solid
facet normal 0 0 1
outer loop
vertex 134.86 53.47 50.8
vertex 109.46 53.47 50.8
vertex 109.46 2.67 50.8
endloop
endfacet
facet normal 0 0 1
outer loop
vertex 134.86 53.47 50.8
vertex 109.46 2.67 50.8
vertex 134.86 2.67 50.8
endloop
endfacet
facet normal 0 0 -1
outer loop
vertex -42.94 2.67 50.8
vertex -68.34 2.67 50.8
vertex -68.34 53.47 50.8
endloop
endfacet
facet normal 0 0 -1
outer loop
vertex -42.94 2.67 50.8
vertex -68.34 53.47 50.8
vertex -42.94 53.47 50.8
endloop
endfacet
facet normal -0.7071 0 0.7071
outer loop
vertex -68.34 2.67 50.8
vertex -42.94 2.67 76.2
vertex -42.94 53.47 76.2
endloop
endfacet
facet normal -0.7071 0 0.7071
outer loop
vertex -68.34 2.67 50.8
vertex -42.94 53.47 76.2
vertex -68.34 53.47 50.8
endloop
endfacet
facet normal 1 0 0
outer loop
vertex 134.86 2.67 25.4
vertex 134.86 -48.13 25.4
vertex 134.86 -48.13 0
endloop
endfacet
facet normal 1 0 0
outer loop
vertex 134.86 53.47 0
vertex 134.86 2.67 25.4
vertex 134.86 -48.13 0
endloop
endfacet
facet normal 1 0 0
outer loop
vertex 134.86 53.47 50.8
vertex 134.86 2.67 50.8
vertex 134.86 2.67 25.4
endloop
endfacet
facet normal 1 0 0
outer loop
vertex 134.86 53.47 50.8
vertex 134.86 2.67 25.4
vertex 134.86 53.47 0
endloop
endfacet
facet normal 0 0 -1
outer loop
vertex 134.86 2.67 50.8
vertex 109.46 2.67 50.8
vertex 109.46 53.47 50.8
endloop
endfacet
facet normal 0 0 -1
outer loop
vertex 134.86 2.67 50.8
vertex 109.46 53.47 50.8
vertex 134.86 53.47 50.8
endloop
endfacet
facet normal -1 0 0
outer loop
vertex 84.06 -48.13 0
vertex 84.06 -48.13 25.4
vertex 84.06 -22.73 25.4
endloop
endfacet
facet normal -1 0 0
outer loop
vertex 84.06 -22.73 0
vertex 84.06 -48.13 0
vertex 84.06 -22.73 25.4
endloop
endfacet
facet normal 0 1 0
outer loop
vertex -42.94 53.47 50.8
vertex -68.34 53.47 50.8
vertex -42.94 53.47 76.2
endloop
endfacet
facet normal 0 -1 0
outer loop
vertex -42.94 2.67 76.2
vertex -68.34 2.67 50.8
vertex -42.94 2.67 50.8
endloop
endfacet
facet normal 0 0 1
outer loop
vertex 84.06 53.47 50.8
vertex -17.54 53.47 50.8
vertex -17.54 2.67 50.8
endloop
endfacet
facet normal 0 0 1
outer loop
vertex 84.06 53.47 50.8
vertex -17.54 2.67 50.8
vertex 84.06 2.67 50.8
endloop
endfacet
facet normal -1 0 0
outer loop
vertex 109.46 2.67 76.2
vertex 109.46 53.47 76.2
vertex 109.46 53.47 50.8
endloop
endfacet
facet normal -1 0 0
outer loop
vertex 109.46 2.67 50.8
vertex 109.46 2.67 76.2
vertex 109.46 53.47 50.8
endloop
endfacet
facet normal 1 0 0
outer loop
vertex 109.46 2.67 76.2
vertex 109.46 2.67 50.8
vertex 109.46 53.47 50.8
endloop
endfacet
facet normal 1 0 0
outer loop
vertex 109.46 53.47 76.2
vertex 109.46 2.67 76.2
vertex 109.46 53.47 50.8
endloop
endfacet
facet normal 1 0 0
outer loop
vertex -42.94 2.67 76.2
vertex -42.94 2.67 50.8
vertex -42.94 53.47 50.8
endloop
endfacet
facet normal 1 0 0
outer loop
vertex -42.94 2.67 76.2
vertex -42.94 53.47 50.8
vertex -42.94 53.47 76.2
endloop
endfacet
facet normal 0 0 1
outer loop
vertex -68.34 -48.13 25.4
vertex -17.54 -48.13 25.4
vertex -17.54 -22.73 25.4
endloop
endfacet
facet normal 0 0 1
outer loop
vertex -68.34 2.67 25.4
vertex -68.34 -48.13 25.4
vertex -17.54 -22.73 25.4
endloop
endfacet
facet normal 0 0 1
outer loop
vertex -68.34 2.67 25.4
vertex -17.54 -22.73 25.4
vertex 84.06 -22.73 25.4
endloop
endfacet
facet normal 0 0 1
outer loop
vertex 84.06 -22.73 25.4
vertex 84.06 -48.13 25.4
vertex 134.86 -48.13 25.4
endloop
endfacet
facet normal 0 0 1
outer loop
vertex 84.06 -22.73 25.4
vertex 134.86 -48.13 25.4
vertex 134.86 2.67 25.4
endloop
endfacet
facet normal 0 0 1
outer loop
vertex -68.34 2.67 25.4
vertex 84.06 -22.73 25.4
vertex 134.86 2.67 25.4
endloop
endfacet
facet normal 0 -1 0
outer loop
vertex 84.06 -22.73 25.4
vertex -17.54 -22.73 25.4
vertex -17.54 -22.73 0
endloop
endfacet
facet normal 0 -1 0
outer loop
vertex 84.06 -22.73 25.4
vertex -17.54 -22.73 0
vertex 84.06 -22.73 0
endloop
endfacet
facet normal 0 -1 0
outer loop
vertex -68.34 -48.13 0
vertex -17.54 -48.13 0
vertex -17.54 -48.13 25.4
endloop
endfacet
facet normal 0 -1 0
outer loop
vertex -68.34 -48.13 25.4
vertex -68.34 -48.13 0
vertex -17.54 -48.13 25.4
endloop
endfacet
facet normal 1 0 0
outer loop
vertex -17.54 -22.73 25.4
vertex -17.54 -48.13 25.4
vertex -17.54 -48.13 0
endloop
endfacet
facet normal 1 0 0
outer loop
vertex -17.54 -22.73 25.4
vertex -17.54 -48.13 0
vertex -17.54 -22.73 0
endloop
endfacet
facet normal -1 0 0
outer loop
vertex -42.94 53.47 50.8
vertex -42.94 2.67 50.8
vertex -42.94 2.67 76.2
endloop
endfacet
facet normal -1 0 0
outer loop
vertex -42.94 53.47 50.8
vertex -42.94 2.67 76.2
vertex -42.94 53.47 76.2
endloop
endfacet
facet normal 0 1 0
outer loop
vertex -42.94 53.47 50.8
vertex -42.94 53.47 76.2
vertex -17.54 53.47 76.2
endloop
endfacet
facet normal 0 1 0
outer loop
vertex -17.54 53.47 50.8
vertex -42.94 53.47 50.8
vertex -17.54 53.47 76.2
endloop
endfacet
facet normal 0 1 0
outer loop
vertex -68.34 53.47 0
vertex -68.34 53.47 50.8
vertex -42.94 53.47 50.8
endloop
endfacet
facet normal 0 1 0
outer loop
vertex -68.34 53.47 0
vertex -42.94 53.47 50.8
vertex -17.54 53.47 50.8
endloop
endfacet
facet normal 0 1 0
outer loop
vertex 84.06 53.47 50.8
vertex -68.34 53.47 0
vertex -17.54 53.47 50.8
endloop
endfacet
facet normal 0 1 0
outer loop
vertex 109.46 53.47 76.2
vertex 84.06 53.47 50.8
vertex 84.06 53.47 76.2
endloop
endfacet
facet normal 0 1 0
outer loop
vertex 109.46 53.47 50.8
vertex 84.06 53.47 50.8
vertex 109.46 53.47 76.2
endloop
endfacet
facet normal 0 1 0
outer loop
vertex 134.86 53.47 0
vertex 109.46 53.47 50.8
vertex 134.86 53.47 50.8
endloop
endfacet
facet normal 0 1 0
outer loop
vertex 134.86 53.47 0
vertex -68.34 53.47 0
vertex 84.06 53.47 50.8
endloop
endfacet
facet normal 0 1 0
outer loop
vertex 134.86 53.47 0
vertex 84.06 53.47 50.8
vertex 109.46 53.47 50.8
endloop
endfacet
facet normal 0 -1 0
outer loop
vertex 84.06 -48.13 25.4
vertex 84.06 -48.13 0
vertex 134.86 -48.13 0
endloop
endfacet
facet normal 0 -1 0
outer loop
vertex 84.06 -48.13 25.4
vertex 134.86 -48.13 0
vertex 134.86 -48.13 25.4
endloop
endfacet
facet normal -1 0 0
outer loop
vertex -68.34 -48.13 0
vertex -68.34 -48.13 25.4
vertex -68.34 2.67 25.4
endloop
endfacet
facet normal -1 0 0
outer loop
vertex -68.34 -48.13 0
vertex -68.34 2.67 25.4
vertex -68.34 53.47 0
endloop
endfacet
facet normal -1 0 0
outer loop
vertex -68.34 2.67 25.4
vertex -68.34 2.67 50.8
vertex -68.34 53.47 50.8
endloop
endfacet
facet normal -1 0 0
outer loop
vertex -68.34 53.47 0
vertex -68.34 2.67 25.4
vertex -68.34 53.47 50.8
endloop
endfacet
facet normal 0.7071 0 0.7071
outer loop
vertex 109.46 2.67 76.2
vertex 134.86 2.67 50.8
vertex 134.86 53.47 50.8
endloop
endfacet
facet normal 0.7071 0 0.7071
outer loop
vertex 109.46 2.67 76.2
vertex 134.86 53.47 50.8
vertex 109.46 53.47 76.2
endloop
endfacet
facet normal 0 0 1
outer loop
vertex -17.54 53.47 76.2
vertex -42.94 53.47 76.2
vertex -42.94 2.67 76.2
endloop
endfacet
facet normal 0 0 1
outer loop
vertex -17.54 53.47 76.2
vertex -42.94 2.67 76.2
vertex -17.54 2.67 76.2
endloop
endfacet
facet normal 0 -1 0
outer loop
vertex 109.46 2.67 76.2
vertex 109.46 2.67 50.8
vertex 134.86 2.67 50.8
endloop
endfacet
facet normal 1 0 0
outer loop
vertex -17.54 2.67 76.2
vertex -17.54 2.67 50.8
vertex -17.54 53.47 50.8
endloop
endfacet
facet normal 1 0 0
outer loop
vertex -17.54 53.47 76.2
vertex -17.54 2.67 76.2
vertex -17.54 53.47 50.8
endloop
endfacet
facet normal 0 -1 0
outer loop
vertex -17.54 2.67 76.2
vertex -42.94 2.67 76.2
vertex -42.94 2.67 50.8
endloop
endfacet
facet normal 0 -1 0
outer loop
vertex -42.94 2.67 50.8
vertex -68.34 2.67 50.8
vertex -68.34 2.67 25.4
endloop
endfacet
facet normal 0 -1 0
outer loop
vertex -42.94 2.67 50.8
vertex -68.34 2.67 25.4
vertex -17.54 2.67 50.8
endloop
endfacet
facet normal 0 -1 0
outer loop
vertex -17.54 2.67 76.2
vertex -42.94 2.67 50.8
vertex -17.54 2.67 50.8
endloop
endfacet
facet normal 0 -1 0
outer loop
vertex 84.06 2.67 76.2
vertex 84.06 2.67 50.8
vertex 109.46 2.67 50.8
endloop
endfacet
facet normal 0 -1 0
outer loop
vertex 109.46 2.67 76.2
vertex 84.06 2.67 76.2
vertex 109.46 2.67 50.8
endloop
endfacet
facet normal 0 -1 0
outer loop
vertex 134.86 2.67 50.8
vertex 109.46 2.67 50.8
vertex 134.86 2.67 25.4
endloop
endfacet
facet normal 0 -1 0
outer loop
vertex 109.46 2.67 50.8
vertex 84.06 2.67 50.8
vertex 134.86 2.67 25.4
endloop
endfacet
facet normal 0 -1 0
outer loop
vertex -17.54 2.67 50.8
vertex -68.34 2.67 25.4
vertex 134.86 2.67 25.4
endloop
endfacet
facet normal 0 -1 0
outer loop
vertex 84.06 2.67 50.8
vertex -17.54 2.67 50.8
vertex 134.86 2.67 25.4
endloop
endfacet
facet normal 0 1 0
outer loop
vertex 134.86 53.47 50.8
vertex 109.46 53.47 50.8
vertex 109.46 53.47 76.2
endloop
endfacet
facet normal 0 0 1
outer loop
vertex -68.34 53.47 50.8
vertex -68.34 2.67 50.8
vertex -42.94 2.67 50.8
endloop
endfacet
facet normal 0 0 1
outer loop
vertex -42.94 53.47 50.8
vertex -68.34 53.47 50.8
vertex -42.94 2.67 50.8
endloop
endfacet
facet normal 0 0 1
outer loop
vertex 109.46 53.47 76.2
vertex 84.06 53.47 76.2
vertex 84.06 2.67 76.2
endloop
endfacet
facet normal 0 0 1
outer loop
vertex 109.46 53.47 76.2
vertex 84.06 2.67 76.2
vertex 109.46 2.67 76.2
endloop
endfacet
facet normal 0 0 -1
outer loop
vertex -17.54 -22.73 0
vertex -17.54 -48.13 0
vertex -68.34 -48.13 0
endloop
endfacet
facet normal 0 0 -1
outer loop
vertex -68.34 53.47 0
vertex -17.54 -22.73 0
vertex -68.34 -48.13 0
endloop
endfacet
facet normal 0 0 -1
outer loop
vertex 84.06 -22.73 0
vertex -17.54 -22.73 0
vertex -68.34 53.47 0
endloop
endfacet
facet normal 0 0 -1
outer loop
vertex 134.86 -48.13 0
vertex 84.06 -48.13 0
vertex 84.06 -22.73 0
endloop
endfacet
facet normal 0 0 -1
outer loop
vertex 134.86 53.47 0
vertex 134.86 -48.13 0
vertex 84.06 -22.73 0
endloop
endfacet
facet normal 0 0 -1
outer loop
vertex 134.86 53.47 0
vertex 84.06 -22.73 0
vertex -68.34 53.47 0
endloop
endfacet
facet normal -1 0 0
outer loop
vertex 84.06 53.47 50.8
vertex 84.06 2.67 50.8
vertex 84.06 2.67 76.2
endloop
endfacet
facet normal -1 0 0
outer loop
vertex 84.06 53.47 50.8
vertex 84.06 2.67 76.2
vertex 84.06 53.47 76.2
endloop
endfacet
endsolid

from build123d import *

# Parameters (mm, degrees)
F0_W      = 203.2
F0_H      = 50.8
F1_DEPTH  = 50.8
F2_W      = 25.4
F2_H      = 50.8
F3_DEPTH  = 25.4
F4_W      = 25.4
F4_H      = 50.8
F5_DEPTH  = 25.4
F7_DEPTH  = 50.8
F8_W      = 50.8
F8_H      = 25.4
F9_DEPTH  = 203.2
F10_W     = 101.6
F10_H     = 25.4
F11_DEPTH = 25.4


with BuildPart() as f1:
    # F0 (on Top) → F1 (new body)
    with BuildSketch(Plane.XY):
        with Locations((33.260183, 28.070297)):
            Rectangle(F0_W, F0_H)
    extrude(amount=F1_DEPTH)

    # F2 (on face) → F3 (join)
    with BuildSketch(Plane.XY.offset(50.8)):
        with Locations((96.760183, 28.070297)):
            Rectangle(F2_W, F2_H)
    extrude(amount=F3_DEPTH)

    # F4 (on face) → F5 (join)
    with BuildSketch(Plane.XY.offset(50.8)):
        with Locations((-30.239817, 28.070297)):
            Rectangle(F4_W, F4_H)
    extrude(amount=F5_DEPTH)

    # F8 (on face) → F9 (join)
    with BuildSketch(Plane.YZ.offset(134.860183)):
        with Locations((-22.729703, 12.7)):
            Rectangle(F8_W, F8_H)
    extrude(amount=-F9_DEPTH)

    # F10 (on face) → F11 (cut)
    with BuildSketch(Plane.XY.offset(25.4)):
        with Locations((33.260183, -35.429703)):
            Rectangle(F10_W, F10_H)
    extrude(amount=-F11_DEPTH, mode=Mode.SUBTRACT)


with BuildPart() as f7:
    # F6 (on face) → F7 (new body)
    with BuildSketch(Plane.XZ.offset(-2.670297)):
        Polygon((-42.939817, 76.2), (-68.339817, 50.8), (-42.939817, 50.8), align=None)
        Polygon((134.860183, 50.8), (109.460183, 76.2), (109.460183, 50.8), align=None)
    extrude(amount=-F7_DEPTH)


solid = Compound([f1.part, f7.part])
